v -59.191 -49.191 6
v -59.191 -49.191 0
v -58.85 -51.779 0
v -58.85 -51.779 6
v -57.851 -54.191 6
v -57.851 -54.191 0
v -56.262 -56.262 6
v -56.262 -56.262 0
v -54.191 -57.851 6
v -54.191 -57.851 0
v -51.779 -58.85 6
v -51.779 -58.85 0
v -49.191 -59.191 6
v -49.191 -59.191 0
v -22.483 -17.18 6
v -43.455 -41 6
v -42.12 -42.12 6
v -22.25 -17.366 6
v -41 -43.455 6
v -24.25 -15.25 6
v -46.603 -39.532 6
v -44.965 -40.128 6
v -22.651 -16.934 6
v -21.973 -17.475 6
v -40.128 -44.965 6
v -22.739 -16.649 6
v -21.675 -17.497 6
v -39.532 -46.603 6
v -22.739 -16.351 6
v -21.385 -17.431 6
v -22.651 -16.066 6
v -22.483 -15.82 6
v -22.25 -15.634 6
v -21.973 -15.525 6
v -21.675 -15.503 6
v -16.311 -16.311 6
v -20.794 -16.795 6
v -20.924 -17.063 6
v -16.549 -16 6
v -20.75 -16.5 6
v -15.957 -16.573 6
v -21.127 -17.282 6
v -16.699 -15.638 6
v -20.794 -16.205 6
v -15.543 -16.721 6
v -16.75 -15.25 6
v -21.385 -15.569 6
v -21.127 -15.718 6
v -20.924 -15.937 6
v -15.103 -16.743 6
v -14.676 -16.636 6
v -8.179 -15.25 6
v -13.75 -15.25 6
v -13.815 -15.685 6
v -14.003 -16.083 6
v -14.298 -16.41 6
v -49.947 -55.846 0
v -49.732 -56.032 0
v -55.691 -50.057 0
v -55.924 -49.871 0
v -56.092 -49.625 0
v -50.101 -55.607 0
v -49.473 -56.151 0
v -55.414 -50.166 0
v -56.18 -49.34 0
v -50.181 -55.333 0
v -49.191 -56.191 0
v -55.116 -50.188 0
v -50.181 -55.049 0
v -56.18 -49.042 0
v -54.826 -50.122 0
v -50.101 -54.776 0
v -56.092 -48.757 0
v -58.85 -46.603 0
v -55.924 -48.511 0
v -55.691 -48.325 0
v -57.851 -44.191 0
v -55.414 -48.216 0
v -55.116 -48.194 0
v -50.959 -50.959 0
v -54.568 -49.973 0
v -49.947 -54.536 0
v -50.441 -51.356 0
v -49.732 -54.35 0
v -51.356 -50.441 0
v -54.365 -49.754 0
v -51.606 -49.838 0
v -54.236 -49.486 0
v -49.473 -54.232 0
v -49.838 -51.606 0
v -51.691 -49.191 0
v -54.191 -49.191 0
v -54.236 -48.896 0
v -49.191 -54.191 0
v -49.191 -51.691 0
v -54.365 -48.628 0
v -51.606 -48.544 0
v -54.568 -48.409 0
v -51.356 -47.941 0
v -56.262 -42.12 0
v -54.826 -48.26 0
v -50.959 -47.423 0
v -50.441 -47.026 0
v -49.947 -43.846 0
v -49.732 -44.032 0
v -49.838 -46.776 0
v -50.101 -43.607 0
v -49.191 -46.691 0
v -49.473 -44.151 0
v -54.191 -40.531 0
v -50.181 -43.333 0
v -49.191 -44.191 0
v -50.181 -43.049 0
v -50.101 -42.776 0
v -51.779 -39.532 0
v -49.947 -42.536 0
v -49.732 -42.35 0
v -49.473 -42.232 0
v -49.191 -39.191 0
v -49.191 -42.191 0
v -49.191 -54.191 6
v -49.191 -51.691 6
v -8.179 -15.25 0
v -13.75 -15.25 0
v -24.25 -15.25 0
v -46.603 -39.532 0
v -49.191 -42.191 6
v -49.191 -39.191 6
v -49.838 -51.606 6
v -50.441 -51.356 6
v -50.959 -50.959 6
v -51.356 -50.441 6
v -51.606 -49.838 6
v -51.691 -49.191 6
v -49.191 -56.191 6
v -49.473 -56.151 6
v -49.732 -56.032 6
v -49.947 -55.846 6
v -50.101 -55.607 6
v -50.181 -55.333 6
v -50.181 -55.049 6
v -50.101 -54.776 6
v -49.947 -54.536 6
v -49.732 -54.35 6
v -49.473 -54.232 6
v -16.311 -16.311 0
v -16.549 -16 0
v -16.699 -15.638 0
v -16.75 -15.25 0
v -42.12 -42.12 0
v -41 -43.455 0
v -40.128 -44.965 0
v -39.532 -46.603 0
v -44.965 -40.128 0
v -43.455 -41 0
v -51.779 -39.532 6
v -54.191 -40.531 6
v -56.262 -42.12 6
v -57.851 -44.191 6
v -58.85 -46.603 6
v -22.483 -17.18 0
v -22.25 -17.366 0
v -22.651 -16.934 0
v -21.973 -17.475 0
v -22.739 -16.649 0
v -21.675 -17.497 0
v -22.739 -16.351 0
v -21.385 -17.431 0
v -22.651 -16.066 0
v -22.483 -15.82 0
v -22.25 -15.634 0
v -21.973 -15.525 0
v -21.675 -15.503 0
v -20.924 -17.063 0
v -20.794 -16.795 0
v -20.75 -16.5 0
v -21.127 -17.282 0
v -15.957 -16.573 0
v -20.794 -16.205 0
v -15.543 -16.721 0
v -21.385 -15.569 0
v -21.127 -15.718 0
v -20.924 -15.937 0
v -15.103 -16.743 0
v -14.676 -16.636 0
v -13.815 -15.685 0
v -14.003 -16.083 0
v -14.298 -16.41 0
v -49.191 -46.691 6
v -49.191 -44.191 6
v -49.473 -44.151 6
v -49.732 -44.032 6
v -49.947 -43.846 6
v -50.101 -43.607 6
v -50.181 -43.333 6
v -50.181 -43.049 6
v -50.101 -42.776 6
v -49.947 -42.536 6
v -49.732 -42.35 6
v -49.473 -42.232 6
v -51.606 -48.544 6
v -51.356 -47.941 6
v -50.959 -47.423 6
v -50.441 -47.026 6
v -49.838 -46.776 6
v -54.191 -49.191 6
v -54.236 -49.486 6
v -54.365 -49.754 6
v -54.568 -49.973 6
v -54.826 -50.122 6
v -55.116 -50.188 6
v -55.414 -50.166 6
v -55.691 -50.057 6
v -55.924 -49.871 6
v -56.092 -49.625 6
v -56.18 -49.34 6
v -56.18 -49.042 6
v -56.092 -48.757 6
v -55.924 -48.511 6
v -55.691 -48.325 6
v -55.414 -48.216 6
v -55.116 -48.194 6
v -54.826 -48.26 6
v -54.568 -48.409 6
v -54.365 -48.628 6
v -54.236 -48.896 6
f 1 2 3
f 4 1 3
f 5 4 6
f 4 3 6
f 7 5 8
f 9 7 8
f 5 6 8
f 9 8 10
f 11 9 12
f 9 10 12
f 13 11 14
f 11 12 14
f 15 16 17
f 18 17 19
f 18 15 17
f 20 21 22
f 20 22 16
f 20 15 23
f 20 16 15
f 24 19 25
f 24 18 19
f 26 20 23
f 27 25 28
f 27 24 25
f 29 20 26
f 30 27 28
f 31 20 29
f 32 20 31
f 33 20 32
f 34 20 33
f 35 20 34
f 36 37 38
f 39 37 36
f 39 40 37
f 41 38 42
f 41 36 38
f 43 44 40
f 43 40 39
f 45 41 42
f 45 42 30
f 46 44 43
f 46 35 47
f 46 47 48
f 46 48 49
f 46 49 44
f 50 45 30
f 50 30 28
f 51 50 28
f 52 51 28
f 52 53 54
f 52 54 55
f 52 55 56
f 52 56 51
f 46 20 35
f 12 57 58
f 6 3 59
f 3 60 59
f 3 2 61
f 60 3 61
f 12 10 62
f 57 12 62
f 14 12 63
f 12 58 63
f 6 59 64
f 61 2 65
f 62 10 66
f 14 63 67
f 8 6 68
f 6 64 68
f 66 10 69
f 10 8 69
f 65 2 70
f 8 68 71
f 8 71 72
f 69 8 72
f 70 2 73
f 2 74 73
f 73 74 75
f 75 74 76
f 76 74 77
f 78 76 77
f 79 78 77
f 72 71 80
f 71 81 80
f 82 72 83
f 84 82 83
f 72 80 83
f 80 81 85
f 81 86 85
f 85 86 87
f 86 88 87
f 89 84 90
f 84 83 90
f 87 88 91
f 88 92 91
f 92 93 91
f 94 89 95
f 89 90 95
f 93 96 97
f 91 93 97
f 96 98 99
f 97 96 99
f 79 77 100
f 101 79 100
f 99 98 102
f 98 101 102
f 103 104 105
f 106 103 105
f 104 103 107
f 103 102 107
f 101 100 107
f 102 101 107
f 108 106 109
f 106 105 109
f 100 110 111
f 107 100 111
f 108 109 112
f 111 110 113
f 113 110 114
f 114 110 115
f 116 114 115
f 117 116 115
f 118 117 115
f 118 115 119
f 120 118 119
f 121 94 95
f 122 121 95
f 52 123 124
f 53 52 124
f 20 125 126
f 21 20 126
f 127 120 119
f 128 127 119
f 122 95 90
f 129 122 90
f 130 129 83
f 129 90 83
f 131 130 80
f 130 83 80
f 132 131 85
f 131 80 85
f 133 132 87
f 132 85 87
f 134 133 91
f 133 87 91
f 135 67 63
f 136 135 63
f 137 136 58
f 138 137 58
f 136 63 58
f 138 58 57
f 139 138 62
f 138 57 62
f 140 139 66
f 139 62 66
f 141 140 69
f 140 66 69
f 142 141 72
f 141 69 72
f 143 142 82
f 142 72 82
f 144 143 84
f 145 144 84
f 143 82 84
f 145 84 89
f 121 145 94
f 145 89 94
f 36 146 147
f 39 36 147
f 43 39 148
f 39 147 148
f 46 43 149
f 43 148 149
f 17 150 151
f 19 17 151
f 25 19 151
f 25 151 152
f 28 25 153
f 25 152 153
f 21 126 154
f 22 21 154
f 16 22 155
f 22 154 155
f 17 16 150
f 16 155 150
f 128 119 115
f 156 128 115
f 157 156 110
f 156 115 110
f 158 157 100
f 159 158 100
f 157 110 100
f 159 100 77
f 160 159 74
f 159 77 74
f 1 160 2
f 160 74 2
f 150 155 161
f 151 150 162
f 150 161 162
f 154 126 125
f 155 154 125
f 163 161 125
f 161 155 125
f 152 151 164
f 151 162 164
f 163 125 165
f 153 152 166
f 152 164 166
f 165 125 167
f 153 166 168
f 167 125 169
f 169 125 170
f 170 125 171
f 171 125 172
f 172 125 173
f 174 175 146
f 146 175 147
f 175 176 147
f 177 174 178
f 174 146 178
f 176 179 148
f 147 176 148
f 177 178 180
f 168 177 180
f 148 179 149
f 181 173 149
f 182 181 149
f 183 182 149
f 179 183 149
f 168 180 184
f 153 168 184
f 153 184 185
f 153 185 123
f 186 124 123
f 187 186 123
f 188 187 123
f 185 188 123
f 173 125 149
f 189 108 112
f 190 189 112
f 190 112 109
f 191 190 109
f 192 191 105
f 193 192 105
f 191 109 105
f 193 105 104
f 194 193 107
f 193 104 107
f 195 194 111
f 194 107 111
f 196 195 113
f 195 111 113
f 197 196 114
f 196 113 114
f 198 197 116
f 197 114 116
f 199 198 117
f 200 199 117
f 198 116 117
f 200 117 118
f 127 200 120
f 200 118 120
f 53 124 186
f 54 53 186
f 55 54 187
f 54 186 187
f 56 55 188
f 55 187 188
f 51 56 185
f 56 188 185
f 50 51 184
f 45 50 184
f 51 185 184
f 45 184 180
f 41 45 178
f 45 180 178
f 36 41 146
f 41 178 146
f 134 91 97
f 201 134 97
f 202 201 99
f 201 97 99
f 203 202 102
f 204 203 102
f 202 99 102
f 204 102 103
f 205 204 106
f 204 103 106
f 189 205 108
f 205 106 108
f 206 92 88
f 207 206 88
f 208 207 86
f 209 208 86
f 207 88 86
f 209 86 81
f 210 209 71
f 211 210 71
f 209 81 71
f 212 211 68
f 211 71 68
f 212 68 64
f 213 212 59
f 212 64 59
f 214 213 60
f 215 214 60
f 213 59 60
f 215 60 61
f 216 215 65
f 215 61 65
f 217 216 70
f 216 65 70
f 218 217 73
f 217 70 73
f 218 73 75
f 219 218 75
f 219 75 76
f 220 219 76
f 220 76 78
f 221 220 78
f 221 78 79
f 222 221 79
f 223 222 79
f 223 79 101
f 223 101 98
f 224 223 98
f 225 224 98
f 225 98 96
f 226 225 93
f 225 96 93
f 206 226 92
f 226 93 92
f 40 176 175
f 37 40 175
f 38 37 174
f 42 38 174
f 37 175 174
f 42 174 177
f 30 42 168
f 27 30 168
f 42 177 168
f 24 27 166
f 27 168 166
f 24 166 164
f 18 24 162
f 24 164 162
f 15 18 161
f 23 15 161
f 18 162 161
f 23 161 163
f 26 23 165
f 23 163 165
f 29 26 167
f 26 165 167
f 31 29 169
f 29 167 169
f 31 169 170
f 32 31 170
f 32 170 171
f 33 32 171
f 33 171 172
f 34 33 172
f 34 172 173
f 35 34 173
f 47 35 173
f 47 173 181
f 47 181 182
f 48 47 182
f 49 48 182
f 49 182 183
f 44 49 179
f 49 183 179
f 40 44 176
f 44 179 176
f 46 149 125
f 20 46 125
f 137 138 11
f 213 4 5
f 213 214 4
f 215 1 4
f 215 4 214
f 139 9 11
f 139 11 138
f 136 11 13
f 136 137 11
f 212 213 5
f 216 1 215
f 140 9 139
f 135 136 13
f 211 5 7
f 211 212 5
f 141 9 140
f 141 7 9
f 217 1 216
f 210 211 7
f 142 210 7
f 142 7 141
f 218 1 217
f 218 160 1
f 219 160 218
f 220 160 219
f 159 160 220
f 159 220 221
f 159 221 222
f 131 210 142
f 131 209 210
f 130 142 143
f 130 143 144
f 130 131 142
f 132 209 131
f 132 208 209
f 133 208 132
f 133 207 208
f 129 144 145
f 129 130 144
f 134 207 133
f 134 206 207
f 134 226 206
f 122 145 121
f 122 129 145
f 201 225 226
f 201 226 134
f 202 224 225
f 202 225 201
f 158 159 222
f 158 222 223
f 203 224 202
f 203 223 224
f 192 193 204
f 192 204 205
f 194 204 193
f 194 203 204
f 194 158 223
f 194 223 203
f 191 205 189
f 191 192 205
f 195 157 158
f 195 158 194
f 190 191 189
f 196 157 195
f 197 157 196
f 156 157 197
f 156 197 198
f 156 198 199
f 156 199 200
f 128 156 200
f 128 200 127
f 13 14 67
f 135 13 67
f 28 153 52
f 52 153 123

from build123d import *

# Parameters (mm, degrees)
F1_DEPTH = 6


# Not quite as in the source:
# - a feature names something its author has since deleted; it is built from what else it names


with BuildPart() as f1:
    # F0 (on Top) → F1 (new body)
    with BuildSketch(Plane.XY):
        with BuildLine():
            ThreePointArc((-16.3106601718, -16.3106601718), (-16.6358192988, -15.8240251485), (-16.75, -15.25))
            Line((-16.75, -15.25), (-24.25, -15.25))
            Line((-24.25, -15.25), (-46.6029350459, -39.5318672341))
            ThreePointArc((-46.6029350459, -39.5318672341), (-44.191125497, -40.5308714591), (-42.1200576851, -42.1200576851))
            Line((-42.1200576851, -42.1200576851), (-16.3106601718, -16.3106601718))
        make_face()
        with BuildLine():
            ThreePointArc((-22.75, -16.5), (-21.75, -15.5), (-20.75, -16.5))
            ThreePointArc((-20.75, -16.5), (-21.75, -17.5), (-22.75, -16.5))
        make_face(mode=Mode.SUBTRACT)
        with BuildLine():
            Line((-8.1789321881, -15.25), (-13.75, -15.25))
            ThreePointArc((-13.75, -15.25), (-14.6759748515, -16.6358192988), (-16.3106601718, -16.3106601718))
            Line((-16.3106601718, -16.3106601718), (-42.1200576851, -42.1200576851))
            ThreePointArc((-42.1200576851, -42.1200576851), (-40.5308714591, -44.191125497), (-39.5318672341, -46.6029350459))
            Line((-39.5318672341, -46.6029350459), (-8.1789321881, -15.25))
        make_face()
    extrude(amount=F1_DEPTH)


with BuildPart() as f1b:
    # F0 (on Top) → F1, piece 2 (new body)
    with BuildSketch(Plane.XY):
        with BuildLine():
            Line((-49.191125497, -42.191125497), (-49.191125497, -39.191125497))
            ThreePointArc((-49.191125497, -39.191125497), (-56.2621933088, -42.1200576851), (-59.191125497, -49.191125497))
            Line((-59.191125497, -49.191125497), (-56.191125497, -49.191125497))
            ThreePointArc((-56.191125497, -49.191125497), (-55.191125497, -48.191125497), (-54.191125497, -49.191125497))
            Line((-54.191125497, -49.191125497), (-51.691125497, -49.191125497))
            ThreePointArc((-51.691125497, -49.191125497), (-50.9588924499, -47.423358544), (-49.191125497, -46.691125497))
            Line((-49.191125497, -46.691125497), (-49.191125497, -44.191125497))
            ThreePointArc((-49.191125497, -44.191125497), (-50.191125497, -43.191125497), (-49.191125497, -42.191125497))
        make_face()
        with BuildLine():
            Line((-56.191125497, -49.191125497), (-59.191125497, -49.191125497))
            ThreePointArc((-59.191125497, -49.191125497), (-56.2621933088, -56.2621933088), (-49.191125497, -59.191125497))
            Line((-49.191125497, -59.191125497), (-49.191125497, -56.191125497))
            ThreePointArc((-49.191125497, -56.191125497), (-50.191125497, -55.191125497), (-49.191125497, -54.191125497))
            Line((-49.191125497, -54.191125497), (-49.191125497, -51.691125497))
            ThreePointArc((-49.191125497, -51.691125497), (-50.9588924499, -50.9588924499), (-51.691125497, -49.191125497))
            Line((-51.691125497, -49.191125497), (-54.191125497, -49.191125497))
            ThreePointArc((-54.191125497, -49.191125497), (-55.191125497, -50.191125497), (-56.191125497, -49.191125497))
        make_face()
    extrude(amount=F1_DEPTH)


solid = Compound([f1.part, f1b.part])
